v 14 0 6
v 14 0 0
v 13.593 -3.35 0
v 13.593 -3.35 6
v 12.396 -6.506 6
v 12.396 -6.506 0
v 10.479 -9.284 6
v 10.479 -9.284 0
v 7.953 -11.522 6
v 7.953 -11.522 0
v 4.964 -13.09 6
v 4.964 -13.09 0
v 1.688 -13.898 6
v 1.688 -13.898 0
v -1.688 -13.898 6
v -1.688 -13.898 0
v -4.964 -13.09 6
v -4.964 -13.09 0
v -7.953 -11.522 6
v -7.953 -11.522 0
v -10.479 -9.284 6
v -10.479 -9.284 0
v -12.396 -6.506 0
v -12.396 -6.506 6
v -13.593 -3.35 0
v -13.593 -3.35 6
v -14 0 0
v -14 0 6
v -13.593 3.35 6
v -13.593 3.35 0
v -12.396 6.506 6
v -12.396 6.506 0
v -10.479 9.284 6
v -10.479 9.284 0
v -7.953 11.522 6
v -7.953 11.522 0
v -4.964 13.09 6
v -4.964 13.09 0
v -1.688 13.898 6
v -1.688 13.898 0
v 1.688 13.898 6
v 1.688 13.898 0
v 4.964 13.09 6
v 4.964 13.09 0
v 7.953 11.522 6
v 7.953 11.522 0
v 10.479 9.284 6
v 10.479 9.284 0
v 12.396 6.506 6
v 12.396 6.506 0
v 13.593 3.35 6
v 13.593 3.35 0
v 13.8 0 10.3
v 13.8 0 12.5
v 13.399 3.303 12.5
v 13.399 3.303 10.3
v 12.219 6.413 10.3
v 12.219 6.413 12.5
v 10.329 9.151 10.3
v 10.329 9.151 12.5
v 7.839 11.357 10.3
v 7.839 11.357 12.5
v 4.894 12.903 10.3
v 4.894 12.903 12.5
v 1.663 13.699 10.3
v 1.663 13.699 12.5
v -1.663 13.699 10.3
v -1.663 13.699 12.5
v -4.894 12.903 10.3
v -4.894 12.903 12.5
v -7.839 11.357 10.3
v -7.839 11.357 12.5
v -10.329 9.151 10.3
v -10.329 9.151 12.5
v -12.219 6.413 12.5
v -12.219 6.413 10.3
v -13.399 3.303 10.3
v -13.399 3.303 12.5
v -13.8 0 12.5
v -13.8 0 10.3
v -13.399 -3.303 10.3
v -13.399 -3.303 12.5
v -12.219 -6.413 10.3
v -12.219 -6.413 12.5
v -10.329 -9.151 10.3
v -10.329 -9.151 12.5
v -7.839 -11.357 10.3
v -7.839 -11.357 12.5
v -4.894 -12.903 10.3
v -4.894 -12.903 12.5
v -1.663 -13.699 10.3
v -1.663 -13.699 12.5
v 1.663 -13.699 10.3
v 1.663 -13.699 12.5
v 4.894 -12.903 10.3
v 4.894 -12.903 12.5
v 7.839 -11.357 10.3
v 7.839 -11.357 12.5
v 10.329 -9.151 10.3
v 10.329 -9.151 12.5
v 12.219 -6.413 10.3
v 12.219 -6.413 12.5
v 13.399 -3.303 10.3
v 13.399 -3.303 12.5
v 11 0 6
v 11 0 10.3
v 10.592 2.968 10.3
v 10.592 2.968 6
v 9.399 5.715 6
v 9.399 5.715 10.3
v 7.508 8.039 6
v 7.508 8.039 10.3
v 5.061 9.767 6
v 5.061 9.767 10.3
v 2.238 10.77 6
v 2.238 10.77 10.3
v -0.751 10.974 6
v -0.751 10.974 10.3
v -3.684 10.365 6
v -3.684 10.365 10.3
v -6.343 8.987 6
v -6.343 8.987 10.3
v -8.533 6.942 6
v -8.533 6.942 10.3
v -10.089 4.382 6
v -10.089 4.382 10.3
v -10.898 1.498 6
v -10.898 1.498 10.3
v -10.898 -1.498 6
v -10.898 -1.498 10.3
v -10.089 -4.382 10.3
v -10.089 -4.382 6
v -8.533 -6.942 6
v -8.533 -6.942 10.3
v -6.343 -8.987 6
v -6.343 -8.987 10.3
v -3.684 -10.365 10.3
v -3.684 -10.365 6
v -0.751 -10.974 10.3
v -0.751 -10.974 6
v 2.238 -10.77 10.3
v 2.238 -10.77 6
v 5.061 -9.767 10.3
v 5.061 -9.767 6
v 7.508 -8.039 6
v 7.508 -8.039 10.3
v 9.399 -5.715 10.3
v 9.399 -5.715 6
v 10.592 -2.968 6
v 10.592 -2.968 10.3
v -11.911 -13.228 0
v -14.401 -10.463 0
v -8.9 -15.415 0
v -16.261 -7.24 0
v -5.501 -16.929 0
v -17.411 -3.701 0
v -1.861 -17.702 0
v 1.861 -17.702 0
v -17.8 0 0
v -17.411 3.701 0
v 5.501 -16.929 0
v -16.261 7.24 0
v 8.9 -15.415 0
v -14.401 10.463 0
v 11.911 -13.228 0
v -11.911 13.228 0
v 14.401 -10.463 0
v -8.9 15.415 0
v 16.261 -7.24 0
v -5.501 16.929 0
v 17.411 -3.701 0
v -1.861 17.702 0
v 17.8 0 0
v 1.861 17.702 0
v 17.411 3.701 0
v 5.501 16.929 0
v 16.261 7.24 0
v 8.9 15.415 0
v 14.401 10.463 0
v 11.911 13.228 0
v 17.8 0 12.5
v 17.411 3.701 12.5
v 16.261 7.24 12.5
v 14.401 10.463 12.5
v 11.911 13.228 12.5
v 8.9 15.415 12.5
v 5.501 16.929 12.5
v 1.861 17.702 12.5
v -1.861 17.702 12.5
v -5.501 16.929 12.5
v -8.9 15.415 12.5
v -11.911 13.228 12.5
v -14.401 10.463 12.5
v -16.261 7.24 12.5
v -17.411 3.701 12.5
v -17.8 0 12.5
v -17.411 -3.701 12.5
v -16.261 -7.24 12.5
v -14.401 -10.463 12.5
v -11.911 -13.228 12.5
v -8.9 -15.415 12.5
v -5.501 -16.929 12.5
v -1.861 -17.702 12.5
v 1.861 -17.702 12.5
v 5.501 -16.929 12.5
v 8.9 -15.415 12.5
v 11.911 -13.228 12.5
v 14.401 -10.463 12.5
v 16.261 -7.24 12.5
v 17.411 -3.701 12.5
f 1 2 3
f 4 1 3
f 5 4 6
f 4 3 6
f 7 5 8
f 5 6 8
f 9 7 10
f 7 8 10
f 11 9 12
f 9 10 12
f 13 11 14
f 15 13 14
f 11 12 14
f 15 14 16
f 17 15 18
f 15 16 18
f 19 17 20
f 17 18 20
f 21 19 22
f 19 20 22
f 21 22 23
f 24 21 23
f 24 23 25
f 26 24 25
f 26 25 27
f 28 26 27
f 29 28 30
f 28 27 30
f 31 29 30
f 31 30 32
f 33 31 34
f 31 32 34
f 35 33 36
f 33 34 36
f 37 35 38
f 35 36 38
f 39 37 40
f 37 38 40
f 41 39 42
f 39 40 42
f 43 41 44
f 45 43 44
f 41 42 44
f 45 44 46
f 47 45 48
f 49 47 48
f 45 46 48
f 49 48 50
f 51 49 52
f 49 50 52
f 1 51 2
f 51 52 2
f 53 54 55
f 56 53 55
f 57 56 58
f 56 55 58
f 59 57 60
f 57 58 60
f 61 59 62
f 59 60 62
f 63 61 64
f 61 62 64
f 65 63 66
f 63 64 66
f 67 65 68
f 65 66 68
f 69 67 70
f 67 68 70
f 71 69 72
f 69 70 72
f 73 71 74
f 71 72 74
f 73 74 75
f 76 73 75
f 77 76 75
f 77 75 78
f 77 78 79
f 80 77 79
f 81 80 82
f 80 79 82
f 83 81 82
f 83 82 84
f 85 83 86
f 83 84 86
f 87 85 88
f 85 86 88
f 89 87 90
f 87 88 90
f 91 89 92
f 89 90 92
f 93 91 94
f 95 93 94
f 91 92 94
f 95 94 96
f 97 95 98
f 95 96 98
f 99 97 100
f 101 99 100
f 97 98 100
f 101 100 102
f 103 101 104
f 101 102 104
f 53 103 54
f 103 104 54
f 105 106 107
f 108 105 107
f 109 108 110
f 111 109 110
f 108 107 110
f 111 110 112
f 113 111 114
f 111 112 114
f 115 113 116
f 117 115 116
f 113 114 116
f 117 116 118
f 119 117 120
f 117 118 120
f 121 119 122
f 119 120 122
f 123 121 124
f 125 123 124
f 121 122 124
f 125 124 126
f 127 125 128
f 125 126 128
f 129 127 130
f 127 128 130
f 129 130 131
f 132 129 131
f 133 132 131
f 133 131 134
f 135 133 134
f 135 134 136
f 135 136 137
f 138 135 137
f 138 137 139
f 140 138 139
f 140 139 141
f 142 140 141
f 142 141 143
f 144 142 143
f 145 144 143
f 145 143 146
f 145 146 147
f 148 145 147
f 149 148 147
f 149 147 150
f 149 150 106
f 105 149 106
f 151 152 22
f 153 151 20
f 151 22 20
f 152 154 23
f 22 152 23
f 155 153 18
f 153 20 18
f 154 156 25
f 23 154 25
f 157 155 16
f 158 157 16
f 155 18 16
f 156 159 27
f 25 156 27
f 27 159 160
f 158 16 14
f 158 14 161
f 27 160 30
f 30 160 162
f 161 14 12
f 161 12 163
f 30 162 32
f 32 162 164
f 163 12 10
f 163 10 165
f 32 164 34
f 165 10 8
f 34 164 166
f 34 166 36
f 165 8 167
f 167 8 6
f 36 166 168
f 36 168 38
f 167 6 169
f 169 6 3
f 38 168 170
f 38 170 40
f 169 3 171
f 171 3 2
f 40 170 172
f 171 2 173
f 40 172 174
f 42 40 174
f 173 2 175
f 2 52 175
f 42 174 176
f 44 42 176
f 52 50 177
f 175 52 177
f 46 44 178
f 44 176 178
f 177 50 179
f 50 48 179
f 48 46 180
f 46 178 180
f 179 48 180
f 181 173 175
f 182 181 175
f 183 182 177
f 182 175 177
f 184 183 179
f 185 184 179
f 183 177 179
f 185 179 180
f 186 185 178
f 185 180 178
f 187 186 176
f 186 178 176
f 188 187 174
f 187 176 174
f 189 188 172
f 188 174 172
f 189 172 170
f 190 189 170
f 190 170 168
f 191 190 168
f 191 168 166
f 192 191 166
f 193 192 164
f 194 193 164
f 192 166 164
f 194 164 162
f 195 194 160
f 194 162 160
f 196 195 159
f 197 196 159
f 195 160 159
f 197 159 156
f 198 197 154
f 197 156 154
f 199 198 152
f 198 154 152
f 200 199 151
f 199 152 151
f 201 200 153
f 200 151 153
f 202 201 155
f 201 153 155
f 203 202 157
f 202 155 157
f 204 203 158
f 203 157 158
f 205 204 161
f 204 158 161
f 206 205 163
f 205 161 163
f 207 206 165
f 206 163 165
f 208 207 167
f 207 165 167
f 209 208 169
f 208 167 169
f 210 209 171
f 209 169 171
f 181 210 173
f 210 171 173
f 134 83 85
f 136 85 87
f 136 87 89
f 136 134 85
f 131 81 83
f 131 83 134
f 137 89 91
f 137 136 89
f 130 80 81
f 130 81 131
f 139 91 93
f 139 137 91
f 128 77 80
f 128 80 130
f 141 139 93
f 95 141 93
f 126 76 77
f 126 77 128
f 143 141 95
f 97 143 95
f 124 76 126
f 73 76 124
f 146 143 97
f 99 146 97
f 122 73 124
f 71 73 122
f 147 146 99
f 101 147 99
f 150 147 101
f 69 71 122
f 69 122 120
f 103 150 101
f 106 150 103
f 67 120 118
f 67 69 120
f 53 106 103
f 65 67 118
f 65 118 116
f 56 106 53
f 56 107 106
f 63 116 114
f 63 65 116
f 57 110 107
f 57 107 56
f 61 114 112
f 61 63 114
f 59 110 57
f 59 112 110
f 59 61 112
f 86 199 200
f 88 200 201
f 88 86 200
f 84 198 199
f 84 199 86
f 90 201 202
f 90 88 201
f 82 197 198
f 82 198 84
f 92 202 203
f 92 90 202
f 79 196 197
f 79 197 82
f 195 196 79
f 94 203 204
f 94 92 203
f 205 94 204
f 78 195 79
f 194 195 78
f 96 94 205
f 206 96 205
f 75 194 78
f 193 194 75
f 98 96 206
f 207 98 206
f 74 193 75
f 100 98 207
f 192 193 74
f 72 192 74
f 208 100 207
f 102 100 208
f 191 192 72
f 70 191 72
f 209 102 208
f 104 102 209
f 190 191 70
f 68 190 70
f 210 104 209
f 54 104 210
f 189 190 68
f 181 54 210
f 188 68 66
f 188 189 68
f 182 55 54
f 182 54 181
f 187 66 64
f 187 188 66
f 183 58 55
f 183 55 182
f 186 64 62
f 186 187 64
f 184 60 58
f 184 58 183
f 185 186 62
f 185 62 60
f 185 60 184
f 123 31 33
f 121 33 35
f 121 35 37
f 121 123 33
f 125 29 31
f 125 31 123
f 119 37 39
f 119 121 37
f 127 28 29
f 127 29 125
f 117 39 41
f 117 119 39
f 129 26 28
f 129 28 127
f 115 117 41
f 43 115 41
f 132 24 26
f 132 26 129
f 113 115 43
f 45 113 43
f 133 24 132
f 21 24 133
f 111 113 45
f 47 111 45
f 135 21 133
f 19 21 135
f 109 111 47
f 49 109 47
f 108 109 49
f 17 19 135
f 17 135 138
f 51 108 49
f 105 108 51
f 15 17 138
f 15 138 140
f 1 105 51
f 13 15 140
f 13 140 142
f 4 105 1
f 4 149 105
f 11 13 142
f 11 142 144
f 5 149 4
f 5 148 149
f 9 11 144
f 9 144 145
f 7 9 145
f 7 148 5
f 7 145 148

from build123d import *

# Parameters (mm, degrees)
F0_R     = 17.8
F1_DEPTH = 12.5
F2_R     = 11
F3_DEPTH = 25
F4_R     = 14
F5_DEPTH = 6
F6_R     = 13.8
F7_DEPTH = 2.2


with BuildPart() as f1:
    # F0 (on Top) → F1 (new body)
    with BuildSketch(Plane.XY):
        Circle(F0_R)
    extrude(amount=F1_DEPTH)

    # F2 (on face) → F3 (cut)
    with BuildSketch(Plane.XY.offset(12.5)):
        Circle(F2_R)
    extrude(amount=-F3_DEPTH, mode=Mode.SUBTRACT)

    # F4 (on face) → F5 (cut)
    with BuildSketch(Plane(origin=(0, 0, 0), x_dir=(1, 0, 0), z_dir=(0, 0, -1))):
        Circle(F4_R)
    extrude(amount=-F5_DEPTH, mode=Mode.SUBTRACT)

    # F6 (on face) → F7 (cut)
    with BuildSketch(Plane.XY.offset(12.5)):
        Circle(F6_R)
    extrude(amount=-F7_DEPTH, mode=Mode.SUBTRACT)


solid = f1.part
